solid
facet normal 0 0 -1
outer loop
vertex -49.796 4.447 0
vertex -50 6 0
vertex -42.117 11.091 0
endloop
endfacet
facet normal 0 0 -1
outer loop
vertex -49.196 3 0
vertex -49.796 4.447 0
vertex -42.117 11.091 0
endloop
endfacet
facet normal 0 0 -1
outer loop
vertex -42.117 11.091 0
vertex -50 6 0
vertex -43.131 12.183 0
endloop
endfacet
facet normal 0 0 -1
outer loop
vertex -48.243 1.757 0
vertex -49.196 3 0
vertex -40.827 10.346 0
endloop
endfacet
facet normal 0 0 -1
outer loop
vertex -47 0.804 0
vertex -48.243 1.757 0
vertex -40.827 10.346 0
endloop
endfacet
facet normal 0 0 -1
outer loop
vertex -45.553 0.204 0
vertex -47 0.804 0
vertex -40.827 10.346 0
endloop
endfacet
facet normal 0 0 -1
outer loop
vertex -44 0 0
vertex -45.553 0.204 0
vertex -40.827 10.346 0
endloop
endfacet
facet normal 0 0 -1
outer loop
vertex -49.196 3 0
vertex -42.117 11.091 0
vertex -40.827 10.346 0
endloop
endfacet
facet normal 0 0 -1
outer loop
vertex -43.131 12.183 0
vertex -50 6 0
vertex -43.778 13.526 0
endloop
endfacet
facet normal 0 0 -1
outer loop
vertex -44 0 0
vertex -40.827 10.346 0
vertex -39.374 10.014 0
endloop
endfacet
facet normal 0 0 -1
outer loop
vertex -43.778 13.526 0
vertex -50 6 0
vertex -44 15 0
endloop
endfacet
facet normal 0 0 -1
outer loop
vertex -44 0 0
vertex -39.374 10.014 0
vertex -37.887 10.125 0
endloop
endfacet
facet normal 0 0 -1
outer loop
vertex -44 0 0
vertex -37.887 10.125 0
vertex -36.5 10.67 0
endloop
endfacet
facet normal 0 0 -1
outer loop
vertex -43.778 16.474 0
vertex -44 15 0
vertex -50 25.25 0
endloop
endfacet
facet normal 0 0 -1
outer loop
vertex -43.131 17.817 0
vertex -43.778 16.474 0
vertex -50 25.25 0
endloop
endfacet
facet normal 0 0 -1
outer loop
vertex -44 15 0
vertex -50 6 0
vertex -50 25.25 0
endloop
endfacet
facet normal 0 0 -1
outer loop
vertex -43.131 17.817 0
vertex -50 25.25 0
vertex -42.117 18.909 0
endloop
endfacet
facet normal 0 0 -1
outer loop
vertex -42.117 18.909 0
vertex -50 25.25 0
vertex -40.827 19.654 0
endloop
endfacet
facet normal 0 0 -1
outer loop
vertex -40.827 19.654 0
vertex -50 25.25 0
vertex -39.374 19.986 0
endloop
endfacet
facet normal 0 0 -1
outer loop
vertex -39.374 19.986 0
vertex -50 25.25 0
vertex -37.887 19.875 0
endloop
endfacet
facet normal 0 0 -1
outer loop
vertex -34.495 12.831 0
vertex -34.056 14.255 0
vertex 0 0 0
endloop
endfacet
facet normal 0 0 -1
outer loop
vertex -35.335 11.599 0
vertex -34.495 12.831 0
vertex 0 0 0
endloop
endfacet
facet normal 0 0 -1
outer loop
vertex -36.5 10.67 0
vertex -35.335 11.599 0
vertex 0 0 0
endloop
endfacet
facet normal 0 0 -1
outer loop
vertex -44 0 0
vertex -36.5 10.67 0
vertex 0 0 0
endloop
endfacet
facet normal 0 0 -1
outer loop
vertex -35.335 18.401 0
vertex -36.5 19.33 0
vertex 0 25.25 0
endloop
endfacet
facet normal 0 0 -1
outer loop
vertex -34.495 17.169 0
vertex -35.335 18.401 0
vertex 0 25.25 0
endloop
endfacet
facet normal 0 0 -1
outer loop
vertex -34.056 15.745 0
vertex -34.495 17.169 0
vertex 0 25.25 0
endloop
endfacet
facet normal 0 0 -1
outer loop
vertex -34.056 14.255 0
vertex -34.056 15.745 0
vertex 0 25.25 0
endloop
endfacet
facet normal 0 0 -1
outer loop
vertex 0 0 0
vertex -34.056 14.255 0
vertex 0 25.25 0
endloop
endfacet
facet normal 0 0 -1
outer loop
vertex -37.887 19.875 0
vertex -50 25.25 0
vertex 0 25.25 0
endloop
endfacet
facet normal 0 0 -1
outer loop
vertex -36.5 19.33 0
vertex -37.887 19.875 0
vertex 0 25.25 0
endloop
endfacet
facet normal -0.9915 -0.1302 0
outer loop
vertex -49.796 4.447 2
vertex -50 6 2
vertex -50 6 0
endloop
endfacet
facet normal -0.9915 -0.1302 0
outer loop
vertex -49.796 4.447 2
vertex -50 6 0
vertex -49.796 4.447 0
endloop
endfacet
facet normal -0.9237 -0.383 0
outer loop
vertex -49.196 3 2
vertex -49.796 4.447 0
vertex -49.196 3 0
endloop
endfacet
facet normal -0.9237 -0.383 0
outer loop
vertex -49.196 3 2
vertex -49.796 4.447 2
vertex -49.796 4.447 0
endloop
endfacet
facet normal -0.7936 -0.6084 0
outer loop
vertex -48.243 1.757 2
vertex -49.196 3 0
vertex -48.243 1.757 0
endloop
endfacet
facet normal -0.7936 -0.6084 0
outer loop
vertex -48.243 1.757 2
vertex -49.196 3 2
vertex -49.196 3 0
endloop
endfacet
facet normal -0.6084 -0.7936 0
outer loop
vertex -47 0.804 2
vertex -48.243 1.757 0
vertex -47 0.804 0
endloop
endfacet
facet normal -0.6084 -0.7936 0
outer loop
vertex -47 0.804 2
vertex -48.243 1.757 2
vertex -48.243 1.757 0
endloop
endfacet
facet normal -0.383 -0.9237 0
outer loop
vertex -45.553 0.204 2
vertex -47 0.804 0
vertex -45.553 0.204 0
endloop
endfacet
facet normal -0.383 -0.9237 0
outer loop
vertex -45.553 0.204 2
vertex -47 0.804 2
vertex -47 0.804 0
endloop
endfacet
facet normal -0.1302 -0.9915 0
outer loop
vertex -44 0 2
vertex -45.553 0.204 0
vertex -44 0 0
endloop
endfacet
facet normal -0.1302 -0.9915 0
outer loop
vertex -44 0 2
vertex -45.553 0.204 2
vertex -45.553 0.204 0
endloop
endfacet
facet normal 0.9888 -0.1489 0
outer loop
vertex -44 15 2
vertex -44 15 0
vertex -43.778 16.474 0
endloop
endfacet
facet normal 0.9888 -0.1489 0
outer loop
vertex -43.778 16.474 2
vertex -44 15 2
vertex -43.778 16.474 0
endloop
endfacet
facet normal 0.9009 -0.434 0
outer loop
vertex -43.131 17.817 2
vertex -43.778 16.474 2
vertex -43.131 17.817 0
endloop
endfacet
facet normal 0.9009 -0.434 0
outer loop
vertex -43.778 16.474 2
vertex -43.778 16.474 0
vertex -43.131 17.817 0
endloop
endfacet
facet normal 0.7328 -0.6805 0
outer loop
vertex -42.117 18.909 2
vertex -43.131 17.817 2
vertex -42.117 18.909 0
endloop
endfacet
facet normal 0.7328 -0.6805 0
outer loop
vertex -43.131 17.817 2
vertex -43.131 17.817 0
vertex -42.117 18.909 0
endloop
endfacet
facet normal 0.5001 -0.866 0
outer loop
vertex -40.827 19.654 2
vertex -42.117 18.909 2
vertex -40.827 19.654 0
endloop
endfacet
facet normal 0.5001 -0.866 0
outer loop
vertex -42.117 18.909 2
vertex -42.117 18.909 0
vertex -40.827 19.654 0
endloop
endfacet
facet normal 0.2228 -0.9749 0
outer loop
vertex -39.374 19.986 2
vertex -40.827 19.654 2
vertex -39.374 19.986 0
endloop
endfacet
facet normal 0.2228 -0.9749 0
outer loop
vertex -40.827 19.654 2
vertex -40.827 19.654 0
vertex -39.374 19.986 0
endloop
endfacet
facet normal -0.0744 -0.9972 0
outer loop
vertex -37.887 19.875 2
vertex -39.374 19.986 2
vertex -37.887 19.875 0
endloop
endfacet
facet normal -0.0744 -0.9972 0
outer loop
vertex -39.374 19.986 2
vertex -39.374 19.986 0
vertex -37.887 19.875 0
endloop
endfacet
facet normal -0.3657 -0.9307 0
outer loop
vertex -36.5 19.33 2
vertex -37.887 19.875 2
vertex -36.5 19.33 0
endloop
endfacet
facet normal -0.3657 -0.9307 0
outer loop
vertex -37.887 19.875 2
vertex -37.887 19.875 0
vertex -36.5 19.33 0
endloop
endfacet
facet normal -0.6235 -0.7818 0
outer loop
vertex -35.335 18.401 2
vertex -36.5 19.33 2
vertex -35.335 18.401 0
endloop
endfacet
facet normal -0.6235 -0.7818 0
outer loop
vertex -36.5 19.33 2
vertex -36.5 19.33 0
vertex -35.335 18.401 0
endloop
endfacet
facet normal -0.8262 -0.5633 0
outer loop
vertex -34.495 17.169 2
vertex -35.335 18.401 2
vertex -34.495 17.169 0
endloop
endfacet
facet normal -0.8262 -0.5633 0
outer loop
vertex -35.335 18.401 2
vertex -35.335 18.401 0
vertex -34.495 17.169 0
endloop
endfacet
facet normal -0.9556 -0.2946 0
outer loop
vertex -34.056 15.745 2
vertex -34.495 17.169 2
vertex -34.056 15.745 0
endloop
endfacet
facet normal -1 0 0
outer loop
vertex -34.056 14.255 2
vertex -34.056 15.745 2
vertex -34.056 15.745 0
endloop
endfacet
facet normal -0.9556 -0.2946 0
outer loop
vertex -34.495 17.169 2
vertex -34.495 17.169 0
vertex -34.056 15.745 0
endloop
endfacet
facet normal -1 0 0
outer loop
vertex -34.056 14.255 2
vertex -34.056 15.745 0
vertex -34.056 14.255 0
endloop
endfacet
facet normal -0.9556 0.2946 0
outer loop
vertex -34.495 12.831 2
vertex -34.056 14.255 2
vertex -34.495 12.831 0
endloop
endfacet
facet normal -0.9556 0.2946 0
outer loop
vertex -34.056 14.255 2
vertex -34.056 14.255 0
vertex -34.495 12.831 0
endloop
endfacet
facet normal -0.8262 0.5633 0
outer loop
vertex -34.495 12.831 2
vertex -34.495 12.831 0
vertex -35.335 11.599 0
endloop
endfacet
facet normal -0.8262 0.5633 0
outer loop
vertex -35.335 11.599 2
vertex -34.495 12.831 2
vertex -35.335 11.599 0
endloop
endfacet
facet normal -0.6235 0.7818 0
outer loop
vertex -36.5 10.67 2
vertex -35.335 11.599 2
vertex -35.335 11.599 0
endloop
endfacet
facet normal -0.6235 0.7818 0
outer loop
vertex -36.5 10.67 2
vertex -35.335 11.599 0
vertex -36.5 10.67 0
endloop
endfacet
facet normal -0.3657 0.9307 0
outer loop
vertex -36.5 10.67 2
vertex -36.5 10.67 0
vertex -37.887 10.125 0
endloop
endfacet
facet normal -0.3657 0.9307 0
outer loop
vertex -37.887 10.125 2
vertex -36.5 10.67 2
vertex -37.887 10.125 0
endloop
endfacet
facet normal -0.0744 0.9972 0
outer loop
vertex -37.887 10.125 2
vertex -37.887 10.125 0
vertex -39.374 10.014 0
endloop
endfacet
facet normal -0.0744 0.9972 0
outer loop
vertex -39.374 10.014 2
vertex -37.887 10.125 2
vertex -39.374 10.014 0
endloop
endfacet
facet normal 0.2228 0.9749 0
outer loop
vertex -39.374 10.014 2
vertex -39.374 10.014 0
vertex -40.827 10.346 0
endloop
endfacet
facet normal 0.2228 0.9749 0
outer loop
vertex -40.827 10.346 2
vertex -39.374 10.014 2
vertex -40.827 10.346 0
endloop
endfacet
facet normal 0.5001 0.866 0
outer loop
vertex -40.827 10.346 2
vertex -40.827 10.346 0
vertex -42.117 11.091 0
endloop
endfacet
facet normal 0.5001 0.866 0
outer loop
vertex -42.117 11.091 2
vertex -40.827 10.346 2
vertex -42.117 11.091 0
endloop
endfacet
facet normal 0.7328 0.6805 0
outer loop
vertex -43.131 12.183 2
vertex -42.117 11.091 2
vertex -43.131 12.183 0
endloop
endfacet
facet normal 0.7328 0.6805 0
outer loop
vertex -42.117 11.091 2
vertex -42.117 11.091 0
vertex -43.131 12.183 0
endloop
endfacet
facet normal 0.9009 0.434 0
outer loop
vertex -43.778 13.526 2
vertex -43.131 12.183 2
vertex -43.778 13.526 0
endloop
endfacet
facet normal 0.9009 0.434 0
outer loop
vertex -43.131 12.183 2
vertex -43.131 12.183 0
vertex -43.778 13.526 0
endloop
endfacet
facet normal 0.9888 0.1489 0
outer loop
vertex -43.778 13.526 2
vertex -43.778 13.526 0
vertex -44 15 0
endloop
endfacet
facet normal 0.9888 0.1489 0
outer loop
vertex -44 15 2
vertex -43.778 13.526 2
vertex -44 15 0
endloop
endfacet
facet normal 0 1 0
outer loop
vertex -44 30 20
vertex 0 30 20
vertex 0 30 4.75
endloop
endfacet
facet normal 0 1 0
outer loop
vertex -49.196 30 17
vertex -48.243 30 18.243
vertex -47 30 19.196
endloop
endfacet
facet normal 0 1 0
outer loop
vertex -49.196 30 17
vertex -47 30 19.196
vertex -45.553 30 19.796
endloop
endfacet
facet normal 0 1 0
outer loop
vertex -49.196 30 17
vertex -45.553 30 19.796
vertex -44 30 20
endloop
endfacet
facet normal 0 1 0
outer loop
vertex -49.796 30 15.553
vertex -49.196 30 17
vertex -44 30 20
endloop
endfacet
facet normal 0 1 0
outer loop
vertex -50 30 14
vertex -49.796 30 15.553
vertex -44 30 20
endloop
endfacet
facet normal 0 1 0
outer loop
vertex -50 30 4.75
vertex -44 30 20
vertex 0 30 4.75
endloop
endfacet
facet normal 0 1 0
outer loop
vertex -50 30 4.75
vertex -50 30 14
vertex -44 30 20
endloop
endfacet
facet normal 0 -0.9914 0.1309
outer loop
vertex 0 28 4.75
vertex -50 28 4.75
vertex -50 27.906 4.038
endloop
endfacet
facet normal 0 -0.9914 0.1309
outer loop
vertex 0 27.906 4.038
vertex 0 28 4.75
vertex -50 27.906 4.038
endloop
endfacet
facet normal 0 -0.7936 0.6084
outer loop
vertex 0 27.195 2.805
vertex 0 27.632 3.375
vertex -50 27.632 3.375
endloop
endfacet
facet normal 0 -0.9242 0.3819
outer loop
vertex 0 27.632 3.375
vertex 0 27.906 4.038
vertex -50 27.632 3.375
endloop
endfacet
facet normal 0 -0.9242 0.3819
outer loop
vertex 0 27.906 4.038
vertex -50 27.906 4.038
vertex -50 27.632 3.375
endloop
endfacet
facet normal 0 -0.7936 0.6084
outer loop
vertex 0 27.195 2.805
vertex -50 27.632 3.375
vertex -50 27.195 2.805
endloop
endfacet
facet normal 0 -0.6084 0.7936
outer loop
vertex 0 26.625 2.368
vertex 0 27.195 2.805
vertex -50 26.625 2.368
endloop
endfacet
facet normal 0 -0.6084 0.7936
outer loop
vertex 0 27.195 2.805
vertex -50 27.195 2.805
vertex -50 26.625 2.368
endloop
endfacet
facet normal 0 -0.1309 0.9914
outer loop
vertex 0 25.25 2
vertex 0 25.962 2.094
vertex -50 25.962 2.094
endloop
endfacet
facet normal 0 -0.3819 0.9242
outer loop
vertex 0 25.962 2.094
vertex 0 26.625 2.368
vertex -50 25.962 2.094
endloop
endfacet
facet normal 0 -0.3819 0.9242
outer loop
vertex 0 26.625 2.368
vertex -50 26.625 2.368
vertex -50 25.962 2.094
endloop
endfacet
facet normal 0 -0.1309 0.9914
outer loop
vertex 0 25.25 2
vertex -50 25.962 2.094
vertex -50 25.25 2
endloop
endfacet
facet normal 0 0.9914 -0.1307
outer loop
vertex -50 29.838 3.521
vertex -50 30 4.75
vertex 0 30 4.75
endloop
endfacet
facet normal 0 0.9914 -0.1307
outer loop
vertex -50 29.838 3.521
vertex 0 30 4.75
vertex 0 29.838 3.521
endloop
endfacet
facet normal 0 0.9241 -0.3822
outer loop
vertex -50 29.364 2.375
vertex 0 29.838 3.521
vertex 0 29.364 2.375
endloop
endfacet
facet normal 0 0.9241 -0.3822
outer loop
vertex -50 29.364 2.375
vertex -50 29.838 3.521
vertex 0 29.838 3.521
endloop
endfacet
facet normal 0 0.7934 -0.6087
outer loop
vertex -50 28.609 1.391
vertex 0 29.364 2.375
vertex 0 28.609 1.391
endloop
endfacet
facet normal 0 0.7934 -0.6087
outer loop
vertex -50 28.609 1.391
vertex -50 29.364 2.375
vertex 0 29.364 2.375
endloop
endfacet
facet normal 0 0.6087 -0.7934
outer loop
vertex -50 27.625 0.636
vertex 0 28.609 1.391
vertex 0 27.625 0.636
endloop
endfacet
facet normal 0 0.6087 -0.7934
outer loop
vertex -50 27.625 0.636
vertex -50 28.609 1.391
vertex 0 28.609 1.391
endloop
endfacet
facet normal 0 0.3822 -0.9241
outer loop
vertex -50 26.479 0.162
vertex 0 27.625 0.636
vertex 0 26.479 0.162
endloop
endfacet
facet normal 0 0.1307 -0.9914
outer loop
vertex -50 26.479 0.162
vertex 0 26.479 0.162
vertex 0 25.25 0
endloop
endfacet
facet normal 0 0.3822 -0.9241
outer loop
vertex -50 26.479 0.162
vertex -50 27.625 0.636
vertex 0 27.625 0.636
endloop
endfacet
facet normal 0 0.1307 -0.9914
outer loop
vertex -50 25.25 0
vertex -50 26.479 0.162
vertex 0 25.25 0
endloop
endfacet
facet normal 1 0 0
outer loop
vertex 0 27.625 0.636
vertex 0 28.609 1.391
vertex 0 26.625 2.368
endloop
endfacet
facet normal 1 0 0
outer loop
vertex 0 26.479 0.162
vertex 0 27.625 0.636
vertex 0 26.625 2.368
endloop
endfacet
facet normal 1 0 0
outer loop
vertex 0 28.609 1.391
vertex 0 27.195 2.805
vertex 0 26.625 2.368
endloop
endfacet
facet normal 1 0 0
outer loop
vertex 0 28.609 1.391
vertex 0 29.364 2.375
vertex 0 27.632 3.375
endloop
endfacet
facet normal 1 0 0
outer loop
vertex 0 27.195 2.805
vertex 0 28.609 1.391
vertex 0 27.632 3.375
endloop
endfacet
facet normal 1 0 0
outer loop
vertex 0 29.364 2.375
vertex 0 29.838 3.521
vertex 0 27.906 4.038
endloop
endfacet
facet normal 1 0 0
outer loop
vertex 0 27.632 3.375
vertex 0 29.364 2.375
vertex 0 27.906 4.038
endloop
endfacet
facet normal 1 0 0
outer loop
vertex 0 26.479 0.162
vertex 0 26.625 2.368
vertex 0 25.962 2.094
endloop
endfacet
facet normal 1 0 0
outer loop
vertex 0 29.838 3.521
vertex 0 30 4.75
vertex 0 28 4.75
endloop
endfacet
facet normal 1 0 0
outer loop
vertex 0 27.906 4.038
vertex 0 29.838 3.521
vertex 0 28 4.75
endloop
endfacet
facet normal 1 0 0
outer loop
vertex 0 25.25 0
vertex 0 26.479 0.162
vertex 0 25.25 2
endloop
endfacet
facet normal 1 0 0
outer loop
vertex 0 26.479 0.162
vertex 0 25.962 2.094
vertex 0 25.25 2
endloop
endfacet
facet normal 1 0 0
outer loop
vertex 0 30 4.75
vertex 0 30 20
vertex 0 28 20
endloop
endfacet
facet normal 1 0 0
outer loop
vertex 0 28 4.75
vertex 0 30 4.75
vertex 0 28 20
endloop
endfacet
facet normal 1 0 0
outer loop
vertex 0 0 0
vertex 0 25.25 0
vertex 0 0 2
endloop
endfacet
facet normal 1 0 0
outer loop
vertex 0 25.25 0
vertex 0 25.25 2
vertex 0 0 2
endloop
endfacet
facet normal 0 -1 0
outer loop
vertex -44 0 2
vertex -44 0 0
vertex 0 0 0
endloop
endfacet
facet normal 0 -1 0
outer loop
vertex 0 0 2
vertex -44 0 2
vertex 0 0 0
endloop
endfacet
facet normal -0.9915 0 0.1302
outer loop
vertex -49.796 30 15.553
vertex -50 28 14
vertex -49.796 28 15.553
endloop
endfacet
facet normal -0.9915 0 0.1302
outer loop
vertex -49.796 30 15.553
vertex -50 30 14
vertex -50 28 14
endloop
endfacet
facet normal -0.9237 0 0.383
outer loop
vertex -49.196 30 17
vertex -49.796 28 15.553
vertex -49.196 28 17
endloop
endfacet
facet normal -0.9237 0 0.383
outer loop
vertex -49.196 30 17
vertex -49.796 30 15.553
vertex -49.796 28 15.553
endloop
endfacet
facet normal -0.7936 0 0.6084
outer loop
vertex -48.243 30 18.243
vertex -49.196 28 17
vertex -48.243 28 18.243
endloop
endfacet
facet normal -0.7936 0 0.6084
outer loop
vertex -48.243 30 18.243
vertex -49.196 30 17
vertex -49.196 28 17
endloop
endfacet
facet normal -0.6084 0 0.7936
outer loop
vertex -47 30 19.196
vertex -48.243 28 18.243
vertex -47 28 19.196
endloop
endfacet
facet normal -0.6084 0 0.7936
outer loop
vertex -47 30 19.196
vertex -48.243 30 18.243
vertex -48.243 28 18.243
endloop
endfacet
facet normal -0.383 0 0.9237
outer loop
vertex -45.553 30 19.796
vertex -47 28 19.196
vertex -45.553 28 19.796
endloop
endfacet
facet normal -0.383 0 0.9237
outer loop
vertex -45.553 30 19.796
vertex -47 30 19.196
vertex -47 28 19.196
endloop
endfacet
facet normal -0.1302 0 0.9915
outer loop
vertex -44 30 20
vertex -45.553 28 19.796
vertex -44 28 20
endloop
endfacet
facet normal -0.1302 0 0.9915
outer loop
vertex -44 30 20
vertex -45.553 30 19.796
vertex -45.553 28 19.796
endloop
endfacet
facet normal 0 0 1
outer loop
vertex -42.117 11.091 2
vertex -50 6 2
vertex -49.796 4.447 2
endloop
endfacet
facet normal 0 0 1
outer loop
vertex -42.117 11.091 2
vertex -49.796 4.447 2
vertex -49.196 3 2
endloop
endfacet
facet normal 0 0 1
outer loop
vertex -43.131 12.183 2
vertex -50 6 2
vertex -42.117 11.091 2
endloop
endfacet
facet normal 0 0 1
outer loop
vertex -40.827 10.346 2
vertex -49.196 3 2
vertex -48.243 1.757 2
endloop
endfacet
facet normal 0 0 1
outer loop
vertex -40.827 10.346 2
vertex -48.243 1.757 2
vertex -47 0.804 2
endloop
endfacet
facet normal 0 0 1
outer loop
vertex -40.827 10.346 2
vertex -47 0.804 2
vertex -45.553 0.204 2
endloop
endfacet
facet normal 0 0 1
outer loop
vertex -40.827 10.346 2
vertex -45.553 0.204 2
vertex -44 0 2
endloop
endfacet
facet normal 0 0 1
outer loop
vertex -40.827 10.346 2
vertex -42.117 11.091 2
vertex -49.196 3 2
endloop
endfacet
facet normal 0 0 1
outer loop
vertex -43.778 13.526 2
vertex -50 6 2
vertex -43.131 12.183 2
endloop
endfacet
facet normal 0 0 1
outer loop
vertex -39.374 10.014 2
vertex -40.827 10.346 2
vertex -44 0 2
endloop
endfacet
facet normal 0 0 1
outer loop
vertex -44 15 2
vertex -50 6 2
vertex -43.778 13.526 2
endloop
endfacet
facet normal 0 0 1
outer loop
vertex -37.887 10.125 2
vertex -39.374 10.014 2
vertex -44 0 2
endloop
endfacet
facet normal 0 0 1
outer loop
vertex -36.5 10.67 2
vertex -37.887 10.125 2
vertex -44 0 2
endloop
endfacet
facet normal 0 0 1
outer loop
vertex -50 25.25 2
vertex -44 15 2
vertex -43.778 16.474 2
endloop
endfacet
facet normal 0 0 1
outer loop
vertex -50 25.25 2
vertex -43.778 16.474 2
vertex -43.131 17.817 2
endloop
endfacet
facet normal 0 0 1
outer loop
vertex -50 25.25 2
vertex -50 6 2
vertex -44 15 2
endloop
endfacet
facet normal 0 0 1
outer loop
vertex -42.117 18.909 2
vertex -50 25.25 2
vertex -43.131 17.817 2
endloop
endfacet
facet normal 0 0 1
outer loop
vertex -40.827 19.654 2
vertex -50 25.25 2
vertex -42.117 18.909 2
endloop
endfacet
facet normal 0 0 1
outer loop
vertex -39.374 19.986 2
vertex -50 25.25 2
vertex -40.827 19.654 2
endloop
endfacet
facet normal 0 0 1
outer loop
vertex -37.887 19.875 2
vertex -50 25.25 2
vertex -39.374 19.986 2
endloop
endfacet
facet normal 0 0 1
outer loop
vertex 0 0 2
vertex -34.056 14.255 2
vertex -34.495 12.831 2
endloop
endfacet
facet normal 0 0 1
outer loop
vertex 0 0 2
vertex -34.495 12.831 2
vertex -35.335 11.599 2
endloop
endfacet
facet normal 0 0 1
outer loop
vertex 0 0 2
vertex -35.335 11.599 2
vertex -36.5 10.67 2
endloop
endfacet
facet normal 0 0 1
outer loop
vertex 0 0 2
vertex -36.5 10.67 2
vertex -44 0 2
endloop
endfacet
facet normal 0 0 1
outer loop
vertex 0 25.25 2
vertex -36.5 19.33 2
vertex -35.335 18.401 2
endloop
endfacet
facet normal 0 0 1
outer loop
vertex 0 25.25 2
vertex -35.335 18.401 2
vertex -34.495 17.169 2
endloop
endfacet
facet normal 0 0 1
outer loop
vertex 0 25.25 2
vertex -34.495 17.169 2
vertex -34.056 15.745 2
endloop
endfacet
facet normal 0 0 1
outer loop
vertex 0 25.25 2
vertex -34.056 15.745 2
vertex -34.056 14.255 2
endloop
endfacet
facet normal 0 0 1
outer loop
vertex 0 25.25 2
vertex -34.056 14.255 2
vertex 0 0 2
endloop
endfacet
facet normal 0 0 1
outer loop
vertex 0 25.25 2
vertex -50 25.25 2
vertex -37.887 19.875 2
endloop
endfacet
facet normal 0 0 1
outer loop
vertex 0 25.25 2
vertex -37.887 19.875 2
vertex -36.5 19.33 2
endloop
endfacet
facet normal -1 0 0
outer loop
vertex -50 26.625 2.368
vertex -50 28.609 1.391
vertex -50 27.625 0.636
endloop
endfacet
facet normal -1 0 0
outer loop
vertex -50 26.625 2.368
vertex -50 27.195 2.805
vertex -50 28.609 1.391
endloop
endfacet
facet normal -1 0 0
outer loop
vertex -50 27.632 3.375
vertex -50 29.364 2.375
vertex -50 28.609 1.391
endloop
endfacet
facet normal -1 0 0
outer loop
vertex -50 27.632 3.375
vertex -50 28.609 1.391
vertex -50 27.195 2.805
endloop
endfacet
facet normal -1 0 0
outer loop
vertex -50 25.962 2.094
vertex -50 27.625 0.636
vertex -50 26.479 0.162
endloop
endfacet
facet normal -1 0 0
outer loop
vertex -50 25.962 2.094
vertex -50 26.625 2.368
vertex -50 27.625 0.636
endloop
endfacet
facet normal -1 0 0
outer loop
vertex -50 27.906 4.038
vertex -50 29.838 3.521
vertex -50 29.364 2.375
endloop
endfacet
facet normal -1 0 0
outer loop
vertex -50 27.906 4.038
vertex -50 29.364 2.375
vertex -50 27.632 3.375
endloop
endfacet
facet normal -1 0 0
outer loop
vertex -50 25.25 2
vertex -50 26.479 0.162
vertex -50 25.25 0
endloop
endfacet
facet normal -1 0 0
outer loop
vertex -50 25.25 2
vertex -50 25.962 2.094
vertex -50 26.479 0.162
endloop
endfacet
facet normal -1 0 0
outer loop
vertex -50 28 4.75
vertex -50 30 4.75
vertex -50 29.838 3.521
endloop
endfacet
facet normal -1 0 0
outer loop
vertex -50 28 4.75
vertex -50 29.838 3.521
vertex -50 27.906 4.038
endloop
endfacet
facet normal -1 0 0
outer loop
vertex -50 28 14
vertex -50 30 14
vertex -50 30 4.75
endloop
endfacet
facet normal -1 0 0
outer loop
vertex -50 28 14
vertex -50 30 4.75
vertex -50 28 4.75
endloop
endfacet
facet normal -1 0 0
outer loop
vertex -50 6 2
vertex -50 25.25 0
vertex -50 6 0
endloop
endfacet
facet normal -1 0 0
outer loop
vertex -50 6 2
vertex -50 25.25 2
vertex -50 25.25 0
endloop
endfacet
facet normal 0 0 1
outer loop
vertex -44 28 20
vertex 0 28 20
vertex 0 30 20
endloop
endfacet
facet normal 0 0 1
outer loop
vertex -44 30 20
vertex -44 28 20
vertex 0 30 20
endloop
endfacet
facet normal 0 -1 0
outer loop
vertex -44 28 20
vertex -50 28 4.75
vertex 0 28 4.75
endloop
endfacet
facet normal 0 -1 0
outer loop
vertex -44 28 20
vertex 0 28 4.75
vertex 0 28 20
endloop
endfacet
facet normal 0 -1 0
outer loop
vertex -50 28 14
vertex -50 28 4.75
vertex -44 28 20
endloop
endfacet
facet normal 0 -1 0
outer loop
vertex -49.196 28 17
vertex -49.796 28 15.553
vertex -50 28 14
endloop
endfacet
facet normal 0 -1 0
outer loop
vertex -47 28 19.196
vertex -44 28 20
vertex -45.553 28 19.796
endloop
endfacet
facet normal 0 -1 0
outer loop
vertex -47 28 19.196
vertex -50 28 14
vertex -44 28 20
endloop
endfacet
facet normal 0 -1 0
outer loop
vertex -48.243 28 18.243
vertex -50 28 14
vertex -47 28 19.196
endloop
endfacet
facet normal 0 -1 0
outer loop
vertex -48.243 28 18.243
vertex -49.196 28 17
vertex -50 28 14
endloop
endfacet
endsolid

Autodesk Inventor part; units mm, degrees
ref_plane "YZ Plane" through (0, 0, 0) normal (1, 0, 0) x (0, 1, 0)
ref_plane "XZ Plane" through (0, 0, 0) normal (0, 1, 0) x (-1, 0, 0)
ref_plane "XY Plane" through (0, 0, 0) normal (0, 0, 1) x (1, 0, 0)
sketch "Sketch2" plane through (0, 0, 0) normal (0, 0, 1) x (1, 0, 0)
  line L0 (0, 0) -> (0, 30)
  line L1 (0, 30) -> (-50, 30)
  line L2 (-50, 30) -> (-50, 0)
  line L3 (-50, 0) -> (0, 0)
  dimension "d10" = 30
  dimension "d30" = 50
extrude "Plate1" add sketch "Sketch2" along normal blind 2
sketch "Sketch3" plane through (-50, 28, 0) normal (0, 1, 0) x (-1, 0, 0)
  line L0 (-50, 0) -> (0, 0)
  line L1 (0, 0) -> (0, 20)
  line L2 (0, 20) -> (-50, 20)
  line L3 (-50, 20) -> (-50, 0)
edge flange "Flange1" height 20 angle 90 thickness 2 bend radius 2.75 thickness toward (0, 1, 0) relief round relief width 2 relief depth 1 edges at (-25, 30, 2) wall of the first edge with corners at (0, 28, 0) (-50, 28, 0) (-50, 28, 20) (0, 28, 20)
bend "Bend1"
corner "Corner1"
fillet "Corner Round1" radius 6 2 edges at (-50, 0, 1) (-50, 29, 20)
sketch "Sketch4" plane through (0, 0, 0) normal (0, 0, -1) x (-1, 0, 0)
  circle A0 centre (39, 15) radius 5
  line L0 (44, 0) -> (0, 0) projected
  dimension "d25" = 10
  dimension "d26" = 15
  dimension "d27" = 5
extrude "Cut1" cut sketch "Sketch4" against normal blind 2
equation "\"d28\" = Thickness"
equation "\"d7\" = Thickness"
equation "\"d14\" = BendReliefWidth"
equation "\"d15\" = BendReliefDepth"
equation "\"d16\" = MinimumRemnant"
equation "\"d17\" = TransitionRadius"
equation "\"d20\" = BendRadius"
equation "\"d21\" = CornerReliefSize"
equation "\"d22\" = GapSize"
equation "\"d23\" = JacobiRadiusSize"
equation "\"BendReliefWidth\" = Thickness"
equation "\"BendReliefDepth\" = 0.5 * Thickness"
equation "\"CornerReliefSize\" = 4 * Thickness"
equation "\"MinimumRemnant\" = 2 * Thickness"
equation "\"TransitionRadius\" = BendRadius"
equation "\"JacobiRadiusSize\" = BendRadius"
equation "\"GapSize\" = Thickness"
equation "\"Thickness\" = 2"
equation "\"BendRadius\" = 2.75"
properties part number "MSC 124 ROСKET PILLAR" material "Stainless Steel"
